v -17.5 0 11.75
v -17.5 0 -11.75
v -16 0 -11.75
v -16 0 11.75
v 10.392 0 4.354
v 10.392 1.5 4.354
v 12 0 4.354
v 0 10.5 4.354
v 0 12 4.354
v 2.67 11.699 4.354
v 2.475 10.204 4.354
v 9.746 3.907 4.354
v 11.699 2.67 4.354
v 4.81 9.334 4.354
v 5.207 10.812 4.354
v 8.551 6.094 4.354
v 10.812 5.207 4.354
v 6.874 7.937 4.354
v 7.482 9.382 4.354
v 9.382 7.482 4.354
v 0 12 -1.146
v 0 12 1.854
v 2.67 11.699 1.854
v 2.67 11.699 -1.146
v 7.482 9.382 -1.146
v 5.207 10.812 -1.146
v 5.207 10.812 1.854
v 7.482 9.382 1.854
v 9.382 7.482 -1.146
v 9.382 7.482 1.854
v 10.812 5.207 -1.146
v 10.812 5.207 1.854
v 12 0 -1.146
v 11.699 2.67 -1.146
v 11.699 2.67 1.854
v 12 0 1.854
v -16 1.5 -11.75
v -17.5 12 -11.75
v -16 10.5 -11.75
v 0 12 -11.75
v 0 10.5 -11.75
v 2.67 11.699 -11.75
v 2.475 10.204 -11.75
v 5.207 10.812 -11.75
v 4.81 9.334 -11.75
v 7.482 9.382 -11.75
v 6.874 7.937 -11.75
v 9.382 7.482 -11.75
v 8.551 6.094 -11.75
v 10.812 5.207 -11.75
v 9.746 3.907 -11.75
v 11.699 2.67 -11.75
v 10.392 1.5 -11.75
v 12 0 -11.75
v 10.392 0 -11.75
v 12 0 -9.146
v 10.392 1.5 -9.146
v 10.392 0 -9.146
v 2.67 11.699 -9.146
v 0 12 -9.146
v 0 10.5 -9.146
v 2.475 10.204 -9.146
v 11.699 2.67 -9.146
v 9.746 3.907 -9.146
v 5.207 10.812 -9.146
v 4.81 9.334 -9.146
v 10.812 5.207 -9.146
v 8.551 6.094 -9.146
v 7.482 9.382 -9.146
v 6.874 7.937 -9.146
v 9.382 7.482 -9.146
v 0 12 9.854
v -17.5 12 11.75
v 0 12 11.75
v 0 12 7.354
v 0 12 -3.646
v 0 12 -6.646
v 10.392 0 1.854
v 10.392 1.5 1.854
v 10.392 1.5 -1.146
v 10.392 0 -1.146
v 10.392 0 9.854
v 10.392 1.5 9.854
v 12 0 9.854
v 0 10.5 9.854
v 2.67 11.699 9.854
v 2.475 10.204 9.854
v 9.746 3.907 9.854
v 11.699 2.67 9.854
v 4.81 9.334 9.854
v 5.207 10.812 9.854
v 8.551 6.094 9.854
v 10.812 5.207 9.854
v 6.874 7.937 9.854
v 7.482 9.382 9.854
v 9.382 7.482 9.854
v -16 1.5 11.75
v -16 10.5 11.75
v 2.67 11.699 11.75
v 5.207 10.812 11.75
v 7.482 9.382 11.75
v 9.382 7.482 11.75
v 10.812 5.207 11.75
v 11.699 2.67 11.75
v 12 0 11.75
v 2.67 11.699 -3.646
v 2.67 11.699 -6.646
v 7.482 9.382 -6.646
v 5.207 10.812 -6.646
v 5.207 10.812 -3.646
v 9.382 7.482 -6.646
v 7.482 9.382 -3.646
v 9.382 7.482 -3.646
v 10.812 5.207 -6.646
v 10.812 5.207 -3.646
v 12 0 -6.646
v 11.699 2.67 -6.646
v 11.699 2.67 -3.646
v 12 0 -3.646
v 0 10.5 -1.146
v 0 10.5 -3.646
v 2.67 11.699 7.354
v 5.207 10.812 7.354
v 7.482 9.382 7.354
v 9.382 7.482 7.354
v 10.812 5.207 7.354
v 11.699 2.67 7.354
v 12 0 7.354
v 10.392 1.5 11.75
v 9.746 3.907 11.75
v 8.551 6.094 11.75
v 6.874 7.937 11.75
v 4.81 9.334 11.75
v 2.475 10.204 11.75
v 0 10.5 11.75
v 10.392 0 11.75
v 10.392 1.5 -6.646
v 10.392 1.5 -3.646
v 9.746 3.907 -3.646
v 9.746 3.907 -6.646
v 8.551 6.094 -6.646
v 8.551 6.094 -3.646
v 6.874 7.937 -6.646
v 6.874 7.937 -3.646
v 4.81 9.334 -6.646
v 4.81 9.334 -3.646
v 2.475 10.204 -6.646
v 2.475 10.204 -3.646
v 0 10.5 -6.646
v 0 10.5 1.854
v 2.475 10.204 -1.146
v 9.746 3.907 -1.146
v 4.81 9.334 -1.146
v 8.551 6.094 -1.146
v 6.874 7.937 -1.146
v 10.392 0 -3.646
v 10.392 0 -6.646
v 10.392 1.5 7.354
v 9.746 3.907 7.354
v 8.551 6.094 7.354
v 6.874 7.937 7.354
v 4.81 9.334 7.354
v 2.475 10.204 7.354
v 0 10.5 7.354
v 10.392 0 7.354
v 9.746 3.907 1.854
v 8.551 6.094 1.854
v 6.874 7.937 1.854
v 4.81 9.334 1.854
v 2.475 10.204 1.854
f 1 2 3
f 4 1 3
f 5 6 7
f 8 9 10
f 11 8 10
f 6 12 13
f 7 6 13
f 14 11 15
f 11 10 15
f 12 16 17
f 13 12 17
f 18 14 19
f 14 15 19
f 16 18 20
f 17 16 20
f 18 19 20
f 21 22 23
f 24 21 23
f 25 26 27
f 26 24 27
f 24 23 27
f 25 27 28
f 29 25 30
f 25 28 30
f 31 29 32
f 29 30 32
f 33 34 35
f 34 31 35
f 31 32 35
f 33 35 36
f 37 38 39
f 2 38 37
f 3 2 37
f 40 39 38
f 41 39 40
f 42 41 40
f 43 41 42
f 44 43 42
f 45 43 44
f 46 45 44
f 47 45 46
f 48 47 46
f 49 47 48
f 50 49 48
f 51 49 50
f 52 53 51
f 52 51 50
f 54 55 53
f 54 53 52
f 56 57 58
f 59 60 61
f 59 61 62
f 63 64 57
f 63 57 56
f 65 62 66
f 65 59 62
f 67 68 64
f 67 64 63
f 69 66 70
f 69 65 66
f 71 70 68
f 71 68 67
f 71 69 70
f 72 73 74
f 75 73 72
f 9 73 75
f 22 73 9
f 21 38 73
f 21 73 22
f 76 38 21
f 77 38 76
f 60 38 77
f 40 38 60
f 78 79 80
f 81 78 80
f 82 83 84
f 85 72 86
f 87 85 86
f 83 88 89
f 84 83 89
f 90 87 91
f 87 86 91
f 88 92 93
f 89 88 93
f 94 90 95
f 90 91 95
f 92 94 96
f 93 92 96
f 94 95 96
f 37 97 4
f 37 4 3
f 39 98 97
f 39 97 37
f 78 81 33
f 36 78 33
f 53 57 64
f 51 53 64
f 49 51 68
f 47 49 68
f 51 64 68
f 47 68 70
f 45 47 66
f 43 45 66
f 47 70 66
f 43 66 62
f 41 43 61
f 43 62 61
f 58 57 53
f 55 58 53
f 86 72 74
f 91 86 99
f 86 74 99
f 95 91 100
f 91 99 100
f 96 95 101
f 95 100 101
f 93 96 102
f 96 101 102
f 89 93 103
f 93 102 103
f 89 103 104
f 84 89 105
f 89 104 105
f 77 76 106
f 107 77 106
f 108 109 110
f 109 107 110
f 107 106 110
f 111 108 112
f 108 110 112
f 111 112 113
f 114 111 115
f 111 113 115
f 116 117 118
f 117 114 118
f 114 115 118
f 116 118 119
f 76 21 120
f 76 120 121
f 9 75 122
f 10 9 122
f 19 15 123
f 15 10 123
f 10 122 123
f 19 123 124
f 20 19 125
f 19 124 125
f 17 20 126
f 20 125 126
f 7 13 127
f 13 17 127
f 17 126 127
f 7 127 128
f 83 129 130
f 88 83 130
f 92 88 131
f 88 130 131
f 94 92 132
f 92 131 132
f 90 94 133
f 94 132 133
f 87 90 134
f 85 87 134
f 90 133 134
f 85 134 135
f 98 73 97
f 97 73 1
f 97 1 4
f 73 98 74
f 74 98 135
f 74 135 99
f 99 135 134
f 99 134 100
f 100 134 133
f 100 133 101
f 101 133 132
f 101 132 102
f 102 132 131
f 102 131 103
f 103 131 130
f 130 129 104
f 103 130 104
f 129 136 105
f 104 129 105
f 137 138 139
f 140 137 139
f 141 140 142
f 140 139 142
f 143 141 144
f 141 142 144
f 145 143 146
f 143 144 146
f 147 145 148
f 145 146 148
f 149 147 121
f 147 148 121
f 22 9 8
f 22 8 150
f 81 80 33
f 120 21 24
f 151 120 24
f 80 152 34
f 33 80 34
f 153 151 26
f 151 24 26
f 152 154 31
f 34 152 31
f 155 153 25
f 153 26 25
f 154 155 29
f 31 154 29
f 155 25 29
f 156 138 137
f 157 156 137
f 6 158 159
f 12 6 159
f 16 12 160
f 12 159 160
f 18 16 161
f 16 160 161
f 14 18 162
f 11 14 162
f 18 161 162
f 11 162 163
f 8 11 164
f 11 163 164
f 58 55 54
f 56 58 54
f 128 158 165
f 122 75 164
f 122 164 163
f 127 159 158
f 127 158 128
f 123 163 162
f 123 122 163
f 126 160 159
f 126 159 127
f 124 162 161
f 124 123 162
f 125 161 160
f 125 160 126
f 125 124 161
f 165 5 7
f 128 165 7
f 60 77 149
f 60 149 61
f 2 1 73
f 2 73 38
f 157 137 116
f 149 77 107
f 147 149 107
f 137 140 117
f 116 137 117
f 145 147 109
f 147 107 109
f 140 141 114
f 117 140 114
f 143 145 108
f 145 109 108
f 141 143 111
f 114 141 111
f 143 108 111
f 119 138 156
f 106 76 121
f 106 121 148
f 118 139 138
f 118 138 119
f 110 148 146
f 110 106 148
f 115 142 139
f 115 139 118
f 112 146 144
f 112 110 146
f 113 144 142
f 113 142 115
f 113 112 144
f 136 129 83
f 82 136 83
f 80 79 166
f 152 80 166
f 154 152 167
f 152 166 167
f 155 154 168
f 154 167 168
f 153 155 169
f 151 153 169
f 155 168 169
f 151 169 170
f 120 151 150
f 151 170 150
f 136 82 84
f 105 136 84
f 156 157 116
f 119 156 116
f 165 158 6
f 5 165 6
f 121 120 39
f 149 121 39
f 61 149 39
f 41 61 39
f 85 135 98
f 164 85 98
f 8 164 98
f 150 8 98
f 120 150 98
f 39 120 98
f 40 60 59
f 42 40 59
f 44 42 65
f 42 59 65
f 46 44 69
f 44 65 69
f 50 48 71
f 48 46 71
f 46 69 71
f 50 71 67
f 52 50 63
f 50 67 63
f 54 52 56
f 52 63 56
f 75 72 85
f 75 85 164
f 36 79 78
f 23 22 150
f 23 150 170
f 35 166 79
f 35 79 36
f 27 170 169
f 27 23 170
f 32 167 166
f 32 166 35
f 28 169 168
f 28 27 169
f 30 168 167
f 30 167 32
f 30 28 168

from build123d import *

# Parameters (mm, degrees)
SKETCH1_W           = 35
SKETCH1_H           = 23.5
BOSS_EXTRUDE1_DEPTH = 12
CUT_EXTRUDE1_DEPTH  = 32.662280398
CUT_EXTRUDE2_DEPTH  = 32.662280398
SKETCH5_W           = 26.392304845
SKETCH5_H           = 23.5
CUT_EXTRUDE3_DEPTH  = 12
SKETCH6_W           = 14.786732963
SKETCH6_H           = 2.5
CUT_EXTRUDE4_DEPTH  = 25.255154091


with BuildPart() as part:
    # Sketch1 → Boss-Extrude1 (new body)
    with BuildSketch(Plane(origin=(0, 0, 0), x_dir=(1, 0, 0), z_dir=(0, 1, 0))):
        Rectangle(SKETCH1_W, SKETCH1_H)
    extrude(amount=BOSS_EXTRUDE1_DEPTH)

    # Sketch3 → Cut-Extrude1 (cut, through all)
    with BuildSketch(Plane.XY.offset(11.75)):
        with BuildLine():
            Line((17.5, 12), (0, 12))
            ThreePointArc((0, 12), (8.485281374, 8.485281374), (12, 0))
            Line((12, 0), (17.5, 0))
            Line((17.5, 0), (17.5, 12))
        make_face()
    extrude(amount=-CUT_EXTRUDE1_DEPTH, mode=Mode.SUBTRACT)

    # Sketch4 → Cut-Extrude2 (cut, through all)
    with BuildSketch(Plane.XY.offset(11.75)):
        with BuildLine():
            Line((-16, 1.5), (10.392304845, 1.5))
            ThreePointArc((10.392304845, 1.5), (6.873863542, 7.937253933), (0, 10.5))
            Line((0, 10.5), (-16, 10.5))
            Line((-16, 10.5), (-16, 1.5))
        make_face()
    extrude(amount=-CUT_EXTRUDE2_DEPTH, mode=Mode.SUBTRACT)

    # Sketch5 → Cut-Extrude3 (cut)
    with BuildSketch(Plane(origin=(0, 1.5, 0), x_dir=(1, 0, 0), z_dir=(0, 1, 0))):
        with Locations((-2.803847578, 0)):
            Rectangle(SKETCH5_W, SKETCH5_H)
    extrude(amount=-CUT_EXTRUDE3_DEPTH, mode=Mode.SUBTRACT)

    # Sketch6 → Cut-Extrude4 (cut, through all)
    with BuildSketch(Plane(origin=(0, 12, 0), x_dir=(1, 0, 0), z_dir=(0, 1, 0))):
        with Locations((7.393366482, -8.60416966)):
            Rectangle(SKETCH6_W, SKETCH6_H)
        with Locations((7.393366482, -3.10416966)):
            Rectangle(SKETCH6_W, SKETCH6_H)
        with Locations((7.393366482, 2.39583034)):
            Rectangle(SKETCH6_W, SKETCH6_H)
        with Locations((7.393366482, 7.89583034)):
            Rectangle(SKETCH6_W, SKETCH6_H)
    extrude(amount=-CUT_EXTRUDE4_DEPTH, mode=Mode.SUBTRACT)


solid = part.part
